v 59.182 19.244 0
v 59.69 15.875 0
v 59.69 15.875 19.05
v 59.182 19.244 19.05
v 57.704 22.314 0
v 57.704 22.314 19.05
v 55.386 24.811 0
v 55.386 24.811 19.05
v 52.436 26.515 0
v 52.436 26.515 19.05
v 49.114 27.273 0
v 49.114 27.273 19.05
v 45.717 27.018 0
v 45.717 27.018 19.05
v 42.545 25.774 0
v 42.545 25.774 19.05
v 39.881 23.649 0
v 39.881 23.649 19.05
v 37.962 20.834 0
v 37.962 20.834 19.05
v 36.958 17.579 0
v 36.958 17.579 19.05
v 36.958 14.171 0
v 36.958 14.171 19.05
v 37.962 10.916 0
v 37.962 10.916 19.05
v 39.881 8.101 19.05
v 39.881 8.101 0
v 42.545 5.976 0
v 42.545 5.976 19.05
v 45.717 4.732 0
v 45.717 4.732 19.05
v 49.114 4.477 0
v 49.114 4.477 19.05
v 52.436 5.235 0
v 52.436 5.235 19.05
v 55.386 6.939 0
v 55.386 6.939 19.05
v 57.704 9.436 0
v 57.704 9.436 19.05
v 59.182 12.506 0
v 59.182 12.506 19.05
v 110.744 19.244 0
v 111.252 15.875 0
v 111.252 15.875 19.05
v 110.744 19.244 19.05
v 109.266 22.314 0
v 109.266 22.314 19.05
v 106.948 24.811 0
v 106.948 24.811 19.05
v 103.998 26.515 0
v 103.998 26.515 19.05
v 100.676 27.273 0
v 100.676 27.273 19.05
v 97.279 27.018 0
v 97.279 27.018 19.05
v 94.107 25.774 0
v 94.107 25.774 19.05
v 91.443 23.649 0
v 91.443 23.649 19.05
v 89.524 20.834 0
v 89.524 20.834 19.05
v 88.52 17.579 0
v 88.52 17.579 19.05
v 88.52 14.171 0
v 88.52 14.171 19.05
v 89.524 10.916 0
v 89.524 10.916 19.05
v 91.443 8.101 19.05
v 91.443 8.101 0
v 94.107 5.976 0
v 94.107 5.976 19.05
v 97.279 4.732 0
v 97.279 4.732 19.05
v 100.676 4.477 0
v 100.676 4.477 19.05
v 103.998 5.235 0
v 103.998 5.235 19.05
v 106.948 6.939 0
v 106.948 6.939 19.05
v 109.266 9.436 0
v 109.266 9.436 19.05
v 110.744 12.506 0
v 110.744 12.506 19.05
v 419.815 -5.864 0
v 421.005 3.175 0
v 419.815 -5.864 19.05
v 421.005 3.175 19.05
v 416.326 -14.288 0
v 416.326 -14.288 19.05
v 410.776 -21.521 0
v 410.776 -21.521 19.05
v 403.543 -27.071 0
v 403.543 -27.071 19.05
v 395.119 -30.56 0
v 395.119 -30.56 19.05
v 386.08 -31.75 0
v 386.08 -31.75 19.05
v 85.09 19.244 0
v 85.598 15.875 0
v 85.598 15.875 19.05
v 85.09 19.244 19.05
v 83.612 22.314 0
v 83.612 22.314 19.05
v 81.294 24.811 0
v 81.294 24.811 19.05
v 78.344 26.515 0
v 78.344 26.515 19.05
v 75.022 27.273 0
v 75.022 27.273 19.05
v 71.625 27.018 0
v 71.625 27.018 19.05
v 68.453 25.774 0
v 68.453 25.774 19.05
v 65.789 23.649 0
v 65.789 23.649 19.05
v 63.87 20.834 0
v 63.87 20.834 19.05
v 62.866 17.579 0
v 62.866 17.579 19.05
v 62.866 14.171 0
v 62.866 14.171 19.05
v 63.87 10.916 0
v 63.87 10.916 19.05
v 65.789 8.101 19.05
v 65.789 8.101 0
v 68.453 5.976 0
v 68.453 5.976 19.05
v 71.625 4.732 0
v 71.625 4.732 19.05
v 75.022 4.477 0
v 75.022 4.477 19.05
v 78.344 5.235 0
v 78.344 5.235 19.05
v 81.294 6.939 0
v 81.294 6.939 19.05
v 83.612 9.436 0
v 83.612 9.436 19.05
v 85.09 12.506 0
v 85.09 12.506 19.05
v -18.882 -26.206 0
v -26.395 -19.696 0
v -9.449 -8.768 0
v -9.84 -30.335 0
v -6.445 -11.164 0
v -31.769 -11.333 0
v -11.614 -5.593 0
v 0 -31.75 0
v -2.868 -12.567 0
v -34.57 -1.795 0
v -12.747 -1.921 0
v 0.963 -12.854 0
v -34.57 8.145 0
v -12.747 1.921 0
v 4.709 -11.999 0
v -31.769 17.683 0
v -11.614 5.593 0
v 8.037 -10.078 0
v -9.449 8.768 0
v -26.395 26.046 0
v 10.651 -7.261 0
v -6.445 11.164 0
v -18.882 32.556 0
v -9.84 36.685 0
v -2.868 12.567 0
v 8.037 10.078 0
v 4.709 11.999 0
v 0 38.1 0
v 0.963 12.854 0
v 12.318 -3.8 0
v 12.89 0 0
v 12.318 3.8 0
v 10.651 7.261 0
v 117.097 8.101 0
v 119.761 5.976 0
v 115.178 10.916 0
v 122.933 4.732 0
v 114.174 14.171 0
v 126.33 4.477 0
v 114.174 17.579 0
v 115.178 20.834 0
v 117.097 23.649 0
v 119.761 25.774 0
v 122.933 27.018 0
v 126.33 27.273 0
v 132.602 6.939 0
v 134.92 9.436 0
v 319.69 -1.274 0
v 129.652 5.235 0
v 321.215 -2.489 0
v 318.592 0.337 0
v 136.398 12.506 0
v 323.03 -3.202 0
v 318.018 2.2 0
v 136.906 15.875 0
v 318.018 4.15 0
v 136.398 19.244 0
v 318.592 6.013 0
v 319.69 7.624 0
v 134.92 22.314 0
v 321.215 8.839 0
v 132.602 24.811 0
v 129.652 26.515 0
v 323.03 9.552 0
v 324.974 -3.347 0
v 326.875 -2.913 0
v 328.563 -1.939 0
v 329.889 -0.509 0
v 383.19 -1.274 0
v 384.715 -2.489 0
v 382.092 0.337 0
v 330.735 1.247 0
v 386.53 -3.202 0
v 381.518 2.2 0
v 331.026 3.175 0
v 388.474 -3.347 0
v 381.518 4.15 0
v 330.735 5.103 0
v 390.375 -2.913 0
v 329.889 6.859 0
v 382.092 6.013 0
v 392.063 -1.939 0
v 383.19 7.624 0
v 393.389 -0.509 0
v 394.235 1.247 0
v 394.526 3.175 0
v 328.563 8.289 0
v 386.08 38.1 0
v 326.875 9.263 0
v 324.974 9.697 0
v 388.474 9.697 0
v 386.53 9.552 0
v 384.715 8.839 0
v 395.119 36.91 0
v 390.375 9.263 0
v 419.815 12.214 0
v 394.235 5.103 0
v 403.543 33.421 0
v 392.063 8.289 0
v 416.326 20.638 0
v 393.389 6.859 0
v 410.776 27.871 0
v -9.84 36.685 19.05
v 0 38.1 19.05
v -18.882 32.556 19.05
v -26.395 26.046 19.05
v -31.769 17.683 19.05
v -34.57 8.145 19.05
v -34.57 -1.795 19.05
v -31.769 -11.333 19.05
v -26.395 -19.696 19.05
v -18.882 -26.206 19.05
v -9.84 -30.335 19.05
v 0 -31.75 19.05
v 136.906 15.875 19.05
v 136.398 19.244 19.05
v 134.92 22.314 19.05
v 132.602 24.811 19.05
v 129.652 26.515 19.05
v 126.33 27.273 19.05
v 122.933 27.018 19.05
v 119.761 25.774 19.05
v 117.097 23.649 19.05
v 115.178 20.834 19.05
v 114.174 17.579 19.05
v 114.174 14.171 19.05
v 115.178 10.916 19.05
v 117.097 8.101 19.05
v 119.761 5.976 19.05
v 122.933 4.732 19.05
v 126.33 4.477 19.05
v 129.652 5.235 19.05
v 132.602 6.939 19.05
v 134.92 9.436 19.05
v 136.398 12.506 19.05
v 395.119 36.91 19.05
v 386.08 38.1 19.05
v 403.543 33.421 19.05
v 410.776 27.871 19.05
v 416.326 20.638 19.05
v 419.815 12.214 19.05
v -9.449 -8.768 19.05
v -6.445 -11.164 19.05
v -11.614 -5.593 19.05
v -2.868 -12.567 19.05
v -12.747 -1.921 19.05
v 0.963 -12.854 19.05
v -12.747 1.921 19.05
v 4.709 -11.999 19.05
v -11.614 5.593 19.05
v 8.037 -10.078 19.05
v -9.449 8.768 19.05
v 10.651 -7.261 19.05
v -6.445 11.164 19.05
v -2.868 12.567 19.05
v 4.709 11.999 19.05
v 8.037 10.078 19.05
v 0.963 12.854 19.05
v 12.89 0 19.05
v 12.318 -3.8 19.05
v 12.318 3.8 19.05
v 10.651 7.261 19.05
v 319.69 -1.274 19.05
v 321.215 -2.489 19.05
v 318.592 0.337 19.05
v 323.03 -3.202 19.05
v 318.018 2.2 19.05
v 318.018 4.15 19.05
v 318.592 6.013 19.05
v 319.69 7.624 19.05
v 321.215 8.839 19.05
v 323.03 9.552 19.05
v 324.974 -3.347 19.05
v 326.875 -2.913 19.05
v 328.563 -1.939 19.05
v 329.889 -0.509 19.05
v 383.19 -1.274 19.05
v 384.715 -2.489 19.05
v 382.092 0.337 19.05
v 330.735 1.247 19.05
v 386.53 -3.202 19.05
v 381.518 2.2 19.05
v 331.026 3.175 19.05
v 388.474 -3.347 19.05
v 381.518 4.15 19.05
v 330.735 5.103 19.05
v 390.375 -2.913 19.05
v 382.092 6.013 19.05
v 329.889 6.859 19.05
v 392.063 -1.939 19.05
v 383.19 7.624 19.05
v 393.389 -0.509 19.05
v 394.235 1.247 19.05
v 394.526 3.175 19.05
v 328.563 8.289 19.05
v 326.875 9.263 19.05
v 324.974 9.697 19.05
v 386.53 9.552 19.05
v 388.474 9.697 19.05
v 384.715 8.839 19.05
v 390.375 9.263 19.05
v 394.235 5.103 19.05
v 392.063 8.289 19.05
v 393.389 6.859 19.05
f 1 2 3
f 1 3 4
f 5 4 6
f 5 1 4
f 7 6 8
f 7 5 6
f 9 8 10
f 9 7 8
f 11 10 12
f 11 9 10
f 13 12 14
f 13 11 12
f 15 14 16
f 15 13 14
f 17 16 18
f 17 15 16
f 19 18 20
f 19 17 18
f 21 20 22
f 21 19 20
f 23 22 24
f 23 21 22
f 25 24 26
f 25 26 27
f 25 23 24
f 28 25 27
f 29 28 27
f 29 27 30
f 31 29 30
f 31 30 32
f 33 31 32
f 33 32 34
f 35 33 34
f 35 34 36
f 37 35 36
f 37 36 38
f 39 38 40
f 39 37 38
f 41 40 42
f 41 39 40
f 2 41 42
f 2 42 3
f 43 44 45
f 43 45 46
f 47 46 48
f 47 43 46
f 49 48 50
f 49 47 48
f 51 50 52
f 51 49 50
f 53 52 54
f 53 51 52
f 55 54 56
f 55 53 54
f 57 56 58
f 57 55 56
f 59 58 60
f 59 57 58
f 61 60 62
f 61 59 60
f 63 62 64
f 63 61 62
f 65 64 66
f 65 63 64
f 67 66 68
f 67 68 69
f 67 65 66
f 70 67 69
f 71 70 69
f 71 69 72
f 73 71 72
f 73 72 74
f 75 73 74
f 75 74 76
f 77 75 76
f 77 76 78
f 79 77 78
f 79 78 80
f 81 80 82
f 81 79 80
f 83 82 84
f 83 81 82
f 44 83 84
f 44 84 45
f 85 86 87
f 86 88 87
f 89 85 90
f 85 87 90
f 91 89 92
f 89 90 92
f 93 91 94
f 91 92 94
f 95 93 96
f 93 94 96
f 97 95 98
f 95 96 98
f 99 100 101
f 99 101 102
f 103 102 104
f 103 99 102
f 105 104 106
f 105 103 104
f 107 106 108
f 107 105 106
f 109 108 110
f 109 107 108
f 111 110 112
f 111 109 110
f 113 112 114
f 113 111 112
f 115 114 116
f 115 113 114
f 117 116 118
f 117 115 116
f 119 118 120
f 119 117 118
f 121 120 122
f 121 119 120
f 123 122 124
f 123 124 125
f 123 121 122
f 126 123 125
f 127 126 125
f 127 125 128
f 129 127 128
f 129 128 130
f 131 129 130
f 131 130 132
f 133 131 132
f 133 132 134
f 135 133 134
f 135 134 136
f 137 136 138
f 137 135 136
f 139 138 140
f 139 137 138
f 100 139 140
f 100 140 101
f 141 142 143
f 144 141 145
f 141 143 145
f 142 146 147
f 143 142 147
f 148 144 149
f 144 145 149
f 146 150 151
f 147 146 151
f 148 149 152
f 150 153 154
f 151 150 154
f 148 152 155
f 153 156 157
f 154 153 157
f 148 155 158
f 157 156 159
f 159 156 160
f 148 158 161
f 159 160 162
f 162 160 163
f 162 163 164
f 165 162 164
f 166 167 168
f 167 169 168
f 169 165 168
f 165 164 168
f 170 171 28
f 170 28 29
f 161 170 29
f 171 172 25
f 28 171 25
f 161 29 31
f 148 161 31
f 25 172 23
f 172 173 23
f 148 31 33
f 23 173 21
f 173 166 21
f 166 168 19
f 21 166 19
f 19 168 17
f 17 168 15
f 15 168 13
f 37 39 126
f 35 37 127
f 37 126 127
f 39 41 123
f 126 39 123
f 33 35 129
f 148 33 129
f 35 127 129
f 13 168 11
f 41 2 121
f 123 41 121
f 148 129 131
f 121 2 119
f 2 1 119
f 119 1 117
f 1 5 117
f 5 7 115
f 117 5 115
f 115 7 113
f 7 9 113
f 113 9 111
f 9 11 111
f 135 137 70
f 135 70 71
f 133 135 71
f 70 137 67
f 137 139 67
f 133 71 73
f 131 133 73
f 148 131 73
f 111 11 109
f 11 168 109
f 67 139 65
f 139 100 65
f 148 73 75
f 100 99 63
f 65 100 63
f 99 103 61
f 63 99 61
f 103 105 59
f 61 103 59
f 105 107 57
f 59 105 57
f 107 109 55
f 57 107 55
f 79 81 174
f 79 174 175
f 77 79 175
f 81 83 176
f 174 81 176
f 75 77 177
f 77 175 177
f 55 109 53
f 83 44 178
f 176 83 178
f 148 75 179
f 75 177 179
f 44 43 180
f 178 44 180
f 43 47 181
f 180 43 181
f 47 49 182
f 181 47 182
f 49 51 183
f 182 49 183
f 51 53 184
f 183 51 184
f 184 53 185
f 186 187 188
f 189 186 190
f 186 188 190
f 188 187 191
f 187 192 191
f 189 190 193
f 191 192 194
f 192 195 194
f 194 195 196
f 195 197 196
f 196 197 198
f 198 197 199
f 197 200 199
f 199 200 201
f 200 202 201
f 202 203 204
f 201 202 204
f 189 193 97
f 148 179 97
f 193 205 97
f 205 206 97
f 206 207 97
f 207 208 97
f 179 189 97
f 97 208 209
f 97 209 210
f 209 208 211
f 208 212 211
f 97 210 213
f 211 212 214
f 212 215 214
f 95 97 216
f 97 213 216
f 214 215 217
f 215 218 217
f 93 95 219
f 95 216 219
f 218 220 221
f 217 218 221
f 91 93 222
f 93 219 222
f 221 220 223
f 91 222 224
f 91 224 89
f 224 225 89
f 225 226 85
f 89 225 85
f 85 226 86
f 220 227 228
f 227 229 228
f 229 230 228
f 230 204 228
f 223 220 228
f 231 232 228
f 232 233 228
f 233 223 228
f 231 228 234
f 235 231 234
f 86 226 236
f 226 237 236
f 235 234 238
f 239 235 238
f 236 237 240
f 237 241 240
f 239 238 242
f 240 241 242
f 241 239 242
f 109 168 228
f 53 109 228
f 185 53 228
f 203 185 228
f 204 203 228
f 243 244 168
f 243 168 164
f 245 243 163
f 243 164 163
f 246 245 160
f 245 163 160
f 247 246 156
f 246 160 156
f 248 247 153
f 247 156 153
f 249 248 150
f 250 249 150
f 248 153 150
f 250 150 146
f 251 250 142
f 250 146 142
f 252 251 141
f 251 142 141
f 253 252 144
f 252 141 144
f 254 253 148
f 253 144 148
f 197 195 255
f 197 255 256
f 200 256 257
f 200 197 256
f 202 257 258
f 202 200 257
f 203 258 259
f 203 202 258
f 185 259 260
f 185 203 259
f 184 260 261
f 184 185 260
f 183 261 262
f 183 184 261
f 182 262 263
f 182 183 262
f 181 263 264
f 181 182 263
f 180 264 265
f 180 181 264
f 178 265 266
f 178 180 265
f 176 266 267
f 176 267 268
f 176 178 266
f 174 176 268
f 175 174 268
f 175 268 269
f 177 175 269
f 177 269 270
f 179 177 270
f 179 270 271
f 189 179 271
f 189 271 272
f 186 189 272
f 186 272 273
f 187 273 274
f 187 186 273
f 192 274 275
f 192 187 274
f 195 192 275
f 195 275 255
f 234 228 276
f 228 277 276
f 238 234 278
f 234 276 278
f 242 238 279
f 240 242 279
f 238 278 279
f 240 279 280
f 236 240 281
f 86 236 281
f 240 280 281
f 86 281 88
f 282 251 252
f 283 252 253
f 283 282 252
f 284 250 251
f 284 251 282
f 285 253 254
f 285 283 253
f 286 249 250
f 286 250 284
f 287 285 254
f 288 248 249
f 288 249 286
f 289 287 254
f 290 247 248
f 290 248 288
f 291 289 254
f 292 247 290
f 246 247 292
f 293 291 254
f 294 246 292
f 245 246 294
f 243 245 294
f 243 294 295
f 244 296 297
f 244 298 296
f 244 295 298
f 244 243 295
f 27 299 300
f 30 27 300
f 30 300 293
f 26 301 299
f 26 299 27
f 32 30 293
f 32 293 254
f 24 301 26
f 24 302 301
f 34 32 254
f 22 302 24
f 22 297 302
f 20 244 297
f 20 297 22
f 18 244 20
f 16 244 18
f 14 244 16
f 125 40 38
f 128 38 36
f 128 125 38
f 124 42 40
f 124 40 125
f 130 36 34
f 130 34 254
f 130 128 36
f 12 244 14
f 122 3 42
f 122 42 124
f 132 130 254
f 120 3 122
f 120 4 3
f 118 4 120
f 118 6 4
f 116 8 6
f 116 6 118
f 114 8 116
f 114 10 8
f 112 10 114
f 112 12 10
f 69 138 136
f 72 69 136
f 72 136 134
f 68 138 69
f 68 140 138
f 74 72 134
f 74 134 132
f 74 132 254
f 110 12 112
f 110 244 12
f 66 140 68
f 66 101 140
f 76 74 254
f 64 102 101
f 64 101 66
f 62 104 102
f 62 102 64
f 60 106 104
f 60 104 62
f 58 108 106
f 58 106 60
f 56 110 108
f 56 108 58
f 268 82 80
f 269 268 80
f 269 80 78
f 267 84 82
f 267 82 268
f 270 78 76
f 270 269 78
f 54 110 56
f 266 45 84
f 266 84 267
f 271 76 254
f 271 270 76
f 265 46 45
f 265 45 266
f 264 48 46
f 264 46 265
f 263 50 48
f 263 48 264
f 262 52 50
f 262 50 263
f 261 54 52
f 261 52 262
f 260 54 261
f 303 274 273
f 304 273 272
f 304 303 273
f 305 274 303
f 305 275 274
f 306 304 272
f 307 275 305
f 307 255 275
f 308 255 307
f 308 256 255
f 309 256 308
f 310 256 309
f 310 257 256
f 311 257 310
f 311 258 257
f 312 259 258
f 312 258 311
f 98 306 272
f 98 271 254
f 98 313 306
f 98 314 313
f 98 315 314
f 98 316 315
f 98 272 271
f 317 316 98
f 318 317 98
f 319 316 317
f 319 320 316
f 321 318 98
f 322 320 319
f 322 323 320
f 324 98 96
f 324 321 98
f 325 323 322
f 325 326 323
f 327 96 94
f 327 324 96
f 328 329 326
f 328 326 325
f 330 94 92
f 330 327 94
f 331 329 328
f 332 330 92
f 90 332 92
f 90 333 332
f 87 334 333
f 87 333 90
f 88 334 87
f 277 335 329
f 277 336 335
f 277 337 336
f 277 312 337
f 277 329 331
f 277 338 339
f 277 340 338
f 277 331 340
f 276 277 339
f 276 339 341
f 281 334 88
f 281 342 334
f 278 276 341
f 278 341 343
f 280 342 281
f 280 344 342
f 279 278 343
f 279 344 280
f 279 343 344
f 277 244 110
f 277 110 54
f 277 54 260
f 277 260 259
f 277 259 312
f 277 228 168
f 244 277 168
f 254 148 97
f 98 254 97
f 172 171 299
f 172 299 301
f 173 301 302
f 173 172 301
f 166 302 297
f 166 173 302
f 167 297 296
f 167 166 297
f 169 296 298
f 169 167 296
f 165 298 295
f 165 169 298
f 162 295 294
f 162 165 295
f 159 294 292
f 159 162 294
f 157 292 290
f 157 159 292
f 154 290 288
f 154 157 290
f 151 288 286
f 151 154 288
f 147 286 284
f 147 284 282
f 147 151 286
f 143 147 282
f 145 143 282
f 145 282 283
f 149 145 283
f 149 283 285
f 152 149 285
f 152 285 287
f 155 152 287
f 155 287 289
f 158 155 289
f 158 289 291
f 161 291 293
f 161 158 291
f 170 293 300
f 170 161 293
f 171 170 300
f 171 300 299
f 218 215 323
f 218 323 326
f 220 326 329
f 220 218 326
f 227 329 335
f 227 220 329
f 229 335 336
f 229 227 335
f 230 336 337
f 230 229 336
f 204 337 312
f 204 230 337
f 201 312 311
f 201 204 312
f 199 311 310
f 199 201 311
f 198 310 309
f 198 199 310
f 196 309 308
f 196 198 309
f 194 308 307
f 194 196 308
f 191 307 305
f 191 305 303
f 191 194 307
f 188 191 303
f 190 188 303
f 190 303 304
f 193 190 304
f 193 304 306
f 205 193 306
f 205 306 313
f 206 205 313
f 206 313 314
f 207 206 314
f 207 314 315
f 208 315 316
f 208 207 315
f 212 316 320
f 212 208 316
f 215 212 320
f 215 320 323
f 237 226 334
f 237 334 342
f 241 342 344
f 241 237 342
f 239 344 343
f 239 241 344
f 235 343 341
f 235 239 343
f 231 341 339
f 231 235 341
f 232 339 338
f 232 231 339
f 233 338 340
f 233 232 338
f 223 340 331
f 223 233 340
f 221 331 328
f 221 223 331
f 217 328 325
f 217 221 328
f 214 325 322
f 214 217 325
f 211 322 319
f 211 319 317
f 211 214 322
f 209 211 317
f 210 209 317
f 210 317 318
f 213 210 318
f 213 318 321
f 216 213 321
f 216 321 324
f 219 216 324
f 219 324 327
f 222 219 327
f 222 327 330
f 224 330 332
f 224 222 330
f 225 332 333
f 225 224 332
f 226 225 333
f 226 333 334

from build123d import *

# Parameters (mm, degrees)
F0_R     = 12.8905
F0_R_2   = 11.43
F0_R_3   = 6.5405
F1_DEPTH = 19.05
F2_R     = 34.92499


# Not quite as in the source:
# - a fillet or chamfer is up to 0.001 mm smaller than in the source, because OpenCascade refuses the exact size


with BuildPart() as f1:
    # F0 (on Top) → F1 (new body)
    with BuildSketch(Plane.XY):
        with BuildLine():
            Line((421.005, 38.1), (0, 38.1))
            ThreePointArc((0, 38.1), (-34.925, 3.175), (0, -31.75))
            Line((0, -31.75), (421.005, -31.75))
            Line((421.005, -31.75), (421.005, 38.1))
        make_face()
        Circle(F0_R, mode=Mode.SUBTRACT)
        with Locations((48.26, 15.875)):
            Circle(F0_R_2, mode=Mode.SUBTRACT)
        with Locations((74.168, 15.875)):
            Circle(F0_R_2, mode=Mode.SUBTRACT)
        with Locations((99.822, 15.875)):
            Circle(F0_R_2, mode=Mode.SUBTRACT)
        with Locations((125.476, 15.875)):
            Circle(F0_R_2, mode=Mode.SUBTRACT)
        with Locations((324.485, 3.175)):
            Circle(F0_R_3, mode=Mode.SUBTRACT)
        with Locations((387.985, 3.175)):
            Circle(F0_R_3, mode=Mode.SUBTRACT)
    extrude(amount=F1_DEPTH)

    # F2 (radius 34.925 in the source; OpenCascade refuses exactly that, so slightly less here)
    f2_edges = [f1.edges().sort_by_distance(p)[0] for p in [
        (421.005, 38.1, 9.525),
        (421.005, -31.75, 9.525),
    ]]
    fillet(f2_edges, radius=F2_R)


solid = f1.part
